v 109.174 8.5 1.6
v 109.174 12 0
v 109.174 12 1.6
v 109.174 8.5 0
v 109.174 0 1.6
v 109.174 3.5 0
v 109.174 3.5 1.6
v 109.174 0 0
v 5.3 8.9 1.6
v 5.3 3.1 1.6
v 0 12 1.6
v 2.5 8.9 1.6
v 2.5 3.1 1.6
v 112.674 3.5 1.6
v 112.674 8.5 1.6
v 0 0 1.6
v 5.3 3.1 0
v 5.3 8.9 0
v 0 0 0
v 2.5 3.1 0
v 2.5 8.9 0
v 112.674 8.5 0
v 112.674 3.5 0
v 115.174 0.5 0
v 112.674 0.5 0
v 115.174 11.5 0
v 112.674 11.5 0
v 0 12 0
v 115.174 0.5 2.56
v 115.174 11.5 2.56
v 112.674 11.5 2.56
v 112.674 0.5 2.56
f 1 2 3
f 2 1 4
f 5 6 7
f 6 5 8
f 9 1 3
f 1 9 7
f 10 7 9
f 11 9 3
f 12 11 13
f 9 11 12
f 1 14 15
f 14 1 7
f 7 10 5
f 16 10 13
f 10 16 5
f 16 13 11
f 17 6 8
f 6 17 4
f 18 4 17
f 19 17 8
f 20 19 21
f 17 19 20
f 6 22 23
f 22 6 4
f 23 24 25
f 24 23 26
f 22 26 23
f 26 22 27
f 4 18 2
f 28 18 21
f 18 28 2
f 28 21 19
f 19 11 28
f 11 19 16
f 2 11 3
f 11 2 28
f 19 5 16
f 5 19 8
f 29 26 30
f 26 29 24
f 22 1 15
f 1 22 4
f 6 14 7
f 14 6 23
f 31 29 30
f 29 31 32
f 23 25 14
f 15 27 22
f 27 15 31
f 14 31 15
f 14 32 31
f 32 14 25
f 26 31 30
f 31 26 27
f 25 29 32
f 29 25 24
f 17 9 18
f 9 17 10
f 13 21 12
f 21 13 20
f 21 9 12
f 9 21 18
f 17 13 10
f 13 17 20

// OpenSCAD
// file: params.scad
// =====================================================================
// EurekaMate - motor mount parameters (all dimensions in mm)
// Target: Eureka Mignon Specialita + aftermarket gear-knob kit
//         (big ring gear on the grind dial + small aluminium knob gear)
//
// Values marked TODO-MEASURE are best guesses from public data and MUST
// be checked with a caliper on your grinder/kit before printing.
// See ../README.md for how to measure.
// =====================================================================

$fn = 64;

// ---------------- Grinder body (Eureka datasheet: W 120 x D 140 x H 350) --------
body_w        = 120;   // width  (Eureka spec sheet / product page)
body_d        = 140;   // depth of the metal body (spec sheet; old manual says 180 incl. fork)  TODO-MEASURE
body_r        = 18;    // vertical corner radius of the body                                     TODO-MEASURE
body_top_z    = 205;   // height of the top surface (where the dial sits) above the table       TODO-MEASURE
clearance     = 0.6;   // fit clearance against the body (per side)

// ---------------- Gear-knob kit ------------------------------------------------
// Kit small gear (the aluminium knob that meshes with the big ring gear)
kit_gear_module   = 1.0;   // gear module of the kit                                             TODO-MEASURE
kit_small_teeth   = 20;    // teeth on the small aluminium knob gear                             TODO-MEASURE (count!)
kit_ring_teeth    = 66;    // teeth on the big ring gear on the dial                              TODO-MEASURE (count!)
kit_knob_od       = kit_gear_module * (kit_small_teeth + 2); // tip diameter of the small gear
kit_knob_height   = 12;    // tooth face width of the small gear                                  TODO-MEASURE
// Position of the small knob gear axis relative to the RIGHT body side and the FRONT face
knob_from_right   = 22;    // distance axis -> right side wall (inwards)                         TODO-MEASURE
knob_from_front   = 30;    // distance axis -> front face (backwards)                             TODO-MEASURE
knob_top_above_body = 14;  // top of the small knob above the body top surface                    TODO-MEASURE

// ---------------- Drive pinion on the stepper ----------------------------------
pinion_teeth      = 12;    // fewer teeth = more reduction/torque, slower travel (min ~10)
pinion_module     = kit_gear_module;
pressure_angle    = 20;
pinion_face       = 10;    // tooth face width
pinion_hub_d      = 12;
pinion_hub_h      = 6;
shaft_d           = 5.0;   // NEMA17 shaft
shaft_flat        = 0.5;   // D-flat depth (standard 0.5 mm)
shaft_clear       = 0.15;  // print tolerance on the bore
setscrew_d        = 3.2;   // M3 grub screw (radial)
nut_w             = 5.6;   // M3 nut trap across flats
backlash          = 0.15;  // tooth thinning per flank

// Centre distance pinion <-> small kit gear (standard gearing)
center_distance   = pinion_module * (pinion_teeth + kit_small_teeth) / 2;

// ---------------- Stepper motor ------------------------------------------------
// Default: 17HS4401 (42.3 x 42.3 x 40 mm, ~0.45 Nm). Pancake: motor_len = 20..25.
motor_w           = 42.3;
motor_len         = 40;
motor_boss_d      = 22.2;  // centring boss
motor_boss_h      = 2.0;
motor_hole_pitch  = 31.0;  // M3 hole spacing
motor_shaft_len   = 24;    // shaft length beyond the face

// ---------------- Electronics bay ----------------------------------------------
tmc_w = 15.5; tmc_l = 20.5; tmc_h = 22;    // TMC2209 module on pin headers incl. heatsink (BTT/FYSETC style)
buck_w = 17.5; buck_l = 22.5; buck_h = 6;   // MP1584 (22x17); Mini560 (~20x15) also fits
cap_d = 10.5;  cap_h = 17;                  // 100-470 uF / 25 V electrolytic (upright)
as5600_w = 23.5; as5600_l = 23.5;           // common AS5600 breakout (magnet 6x2.5 mm in the knob)
wall = 2.4;
floor_t = 3.0;
lid_t = 2.4;
lid_screw_d = 2.6;  // M3 self-tapping into PETG (or 3.2 + heat insert 4.2)
vent_w = 1.6;

// Mesh adjustment: slot length along the pinion->knob line
mesh_slot_len = 6;   // +-3 mm

// ---------------- Side brace + strap -------------------------------------------
brace_h        = 70;    // height of the plate on the right side
brace_t        = 4;     // plate thickness
brace_lip      = 8;     // hook lip over the top edge (slides on from below, then hooks)
brace_depth    = 90;    // front-back length of the plate
strap_w        = 12;    // strap width
strap_t        = 1.6;   // strap thickness (TPU 95A recommended, PETG works with 1.2 mm)
strap_z        = 35;    // strap height on the brace (from top edge, downwards)
strap_segments = 4;     // loop split into printable segments

// Housing floor height above the body top (pinion must clear the body; AS5600 gap)
floor_gap       = 4;      // floor underside sits this far above the knob top
// Optional AS5600 sits on the PINION AXIS: it reads a diametric magnet on the REAR shaft
// of a dual-shaft NEMA17 (e.g. "17HS4401 dual shaft"). Single-shaft motor -> as5600 = false.
as5600         = true;
rear_shaft_len = 10;      // rear shaft stick-out of a dual-shaft motor          TODO-MEASURE
magnet_d = 6; magnet_h = 2.5;  // diametric magnet 6x2.5 mm (often shipped with AS5600 boards)
as5600_gap     = 1.5;     // chip to magnet (datasheet: 0.5..3 mm)
as5600_chip_h  = 1.5;
as5600_pcb_t   = 1.6;

// ---------------- Derived housing geometry (shared by housing, brace, assembly) --
rear_stack = as5600 ? rear_shaft_len + magnet_h + as5600_gap + as5600_chip_h + as5600_pcb_t + 1.5 : 4;
inner_h   = motor_len + rear_stack;
// height of the AS5600 PCB underside above the floor top (chip hangs below it)
as5600_pcb_z = motor_len + rear_shaft_len + magnet_h + as5600_gap + as5600_chip_h;
bay_w     = max(tmc_w, buck_w, cap_d) + 2;
bay_l     = tmc_l + buck_l + cap_d + 8;
motor_box = motor_w + 1.0;
knob_y    = wall + kit_knob_od / 2 + 2;            // knob axis in housing coords
motor_y   = knob_y + center_distance;               // motor axis in housing coords
motor_x   = wall + motor_box / 2;
box_w     = motor_box + bay_w + 3 * wall;
box_l     = max(motor_y + motor_box / 2 + wall, bay_l + 2 * wall);
box_h     = floor_t + inner_h;
foot_len  = 10;
foot_slots = [[-foot_len / 2 - 1, motor_y], [box_w + foot_len / 2 + 1, motor_y]];

// World placement: body top = z 0, front face = y 0, right side = x +body_w/2
knob_world  = [body_w / 2 - knob_from_right, knob_from_front];
floor_z     = knob_top_above_body + floor_gap;      // housing underside
housing_org = [knob_world[0] - motor_x, knob_world[1] - knob_y, floor_z];
// main file
// Closed strap around the whole grinder body, split into printable segments.
// Print in TPU 95A (preferred) or PETG (strap_t 1.2 mm). Segments link with a T-hook into a
// slot. One end loops through the front slot of the brace, the other hooks into the
// tensioner slider (M3 screw) in the rear rail of the brace.
include <params.scad>

perimeter  = 2 * (body_w + 2 * clearance + 2 * strap_t) + 2 * (body_d + 2 * clearance + 2 * strap_t)
             - 8 * body_r + 2 * PI * body_r;
free_len   = perimeter - brace_depth + 20;          // what the segments must cover (+fold-back)
seg_len    = free_len / strap_segments;
hook_l     = 6;

module segment(first = false) {
    difference() {
        union() {
            cube([seg_len, strap_w, strap_t]);
            // T-hook at the +x end (hooks into the slot of the next segment)
            translate([seg_len, strap_w / 2 - 2.5, 0]) cube([hook_l, 5, strap_t]);
            translate([seg_len + hook_l - 2.5, 0.5, 0]) cube([2.5, strap_w - 1, strap_t * 1.6]);
        }
        // slot for the previous segment's hook
        translate([2.5, strap_w / 2 - 2.9, -1]) cube([2.8, 5.8, strap_t + 2]);
    }
}

module tension_slider() {
    // slides in the brace rail; strap hook catches the bar, M3 nut trap pulls it backwards
    difference() {
        cube([6, 18, strap_w]);
        translate([-1, 4, 1.5]) cube([8, 3.2, strap_w - 3]);          // strap slot
        translate([3, 10, strap_w / 2]) rotate([-90, 0, 0]) cylinder(d = 3.4, h = 10);
        translate([0.2, 11, strap_w / 2 - 2.8]) cube([5.6, 2.6, 5.6]); // M3 nut trap
    }
}

part = "segment";   // "segment" | "slider" | "all"
if (part == "segment") segment();
else if (part == "slider") tension_slider();
else {
    for (i = [0 : strap_segments - 1]) translate([0, i * (strap_w + 4), 0]) segment();
    translate([0, strap_segments * (strap_w + 4), 0]) tension_slider();
}
echo(str("strap perimeter = ", perimeter, " mm, segment length = ", seg_len, " mm"));
